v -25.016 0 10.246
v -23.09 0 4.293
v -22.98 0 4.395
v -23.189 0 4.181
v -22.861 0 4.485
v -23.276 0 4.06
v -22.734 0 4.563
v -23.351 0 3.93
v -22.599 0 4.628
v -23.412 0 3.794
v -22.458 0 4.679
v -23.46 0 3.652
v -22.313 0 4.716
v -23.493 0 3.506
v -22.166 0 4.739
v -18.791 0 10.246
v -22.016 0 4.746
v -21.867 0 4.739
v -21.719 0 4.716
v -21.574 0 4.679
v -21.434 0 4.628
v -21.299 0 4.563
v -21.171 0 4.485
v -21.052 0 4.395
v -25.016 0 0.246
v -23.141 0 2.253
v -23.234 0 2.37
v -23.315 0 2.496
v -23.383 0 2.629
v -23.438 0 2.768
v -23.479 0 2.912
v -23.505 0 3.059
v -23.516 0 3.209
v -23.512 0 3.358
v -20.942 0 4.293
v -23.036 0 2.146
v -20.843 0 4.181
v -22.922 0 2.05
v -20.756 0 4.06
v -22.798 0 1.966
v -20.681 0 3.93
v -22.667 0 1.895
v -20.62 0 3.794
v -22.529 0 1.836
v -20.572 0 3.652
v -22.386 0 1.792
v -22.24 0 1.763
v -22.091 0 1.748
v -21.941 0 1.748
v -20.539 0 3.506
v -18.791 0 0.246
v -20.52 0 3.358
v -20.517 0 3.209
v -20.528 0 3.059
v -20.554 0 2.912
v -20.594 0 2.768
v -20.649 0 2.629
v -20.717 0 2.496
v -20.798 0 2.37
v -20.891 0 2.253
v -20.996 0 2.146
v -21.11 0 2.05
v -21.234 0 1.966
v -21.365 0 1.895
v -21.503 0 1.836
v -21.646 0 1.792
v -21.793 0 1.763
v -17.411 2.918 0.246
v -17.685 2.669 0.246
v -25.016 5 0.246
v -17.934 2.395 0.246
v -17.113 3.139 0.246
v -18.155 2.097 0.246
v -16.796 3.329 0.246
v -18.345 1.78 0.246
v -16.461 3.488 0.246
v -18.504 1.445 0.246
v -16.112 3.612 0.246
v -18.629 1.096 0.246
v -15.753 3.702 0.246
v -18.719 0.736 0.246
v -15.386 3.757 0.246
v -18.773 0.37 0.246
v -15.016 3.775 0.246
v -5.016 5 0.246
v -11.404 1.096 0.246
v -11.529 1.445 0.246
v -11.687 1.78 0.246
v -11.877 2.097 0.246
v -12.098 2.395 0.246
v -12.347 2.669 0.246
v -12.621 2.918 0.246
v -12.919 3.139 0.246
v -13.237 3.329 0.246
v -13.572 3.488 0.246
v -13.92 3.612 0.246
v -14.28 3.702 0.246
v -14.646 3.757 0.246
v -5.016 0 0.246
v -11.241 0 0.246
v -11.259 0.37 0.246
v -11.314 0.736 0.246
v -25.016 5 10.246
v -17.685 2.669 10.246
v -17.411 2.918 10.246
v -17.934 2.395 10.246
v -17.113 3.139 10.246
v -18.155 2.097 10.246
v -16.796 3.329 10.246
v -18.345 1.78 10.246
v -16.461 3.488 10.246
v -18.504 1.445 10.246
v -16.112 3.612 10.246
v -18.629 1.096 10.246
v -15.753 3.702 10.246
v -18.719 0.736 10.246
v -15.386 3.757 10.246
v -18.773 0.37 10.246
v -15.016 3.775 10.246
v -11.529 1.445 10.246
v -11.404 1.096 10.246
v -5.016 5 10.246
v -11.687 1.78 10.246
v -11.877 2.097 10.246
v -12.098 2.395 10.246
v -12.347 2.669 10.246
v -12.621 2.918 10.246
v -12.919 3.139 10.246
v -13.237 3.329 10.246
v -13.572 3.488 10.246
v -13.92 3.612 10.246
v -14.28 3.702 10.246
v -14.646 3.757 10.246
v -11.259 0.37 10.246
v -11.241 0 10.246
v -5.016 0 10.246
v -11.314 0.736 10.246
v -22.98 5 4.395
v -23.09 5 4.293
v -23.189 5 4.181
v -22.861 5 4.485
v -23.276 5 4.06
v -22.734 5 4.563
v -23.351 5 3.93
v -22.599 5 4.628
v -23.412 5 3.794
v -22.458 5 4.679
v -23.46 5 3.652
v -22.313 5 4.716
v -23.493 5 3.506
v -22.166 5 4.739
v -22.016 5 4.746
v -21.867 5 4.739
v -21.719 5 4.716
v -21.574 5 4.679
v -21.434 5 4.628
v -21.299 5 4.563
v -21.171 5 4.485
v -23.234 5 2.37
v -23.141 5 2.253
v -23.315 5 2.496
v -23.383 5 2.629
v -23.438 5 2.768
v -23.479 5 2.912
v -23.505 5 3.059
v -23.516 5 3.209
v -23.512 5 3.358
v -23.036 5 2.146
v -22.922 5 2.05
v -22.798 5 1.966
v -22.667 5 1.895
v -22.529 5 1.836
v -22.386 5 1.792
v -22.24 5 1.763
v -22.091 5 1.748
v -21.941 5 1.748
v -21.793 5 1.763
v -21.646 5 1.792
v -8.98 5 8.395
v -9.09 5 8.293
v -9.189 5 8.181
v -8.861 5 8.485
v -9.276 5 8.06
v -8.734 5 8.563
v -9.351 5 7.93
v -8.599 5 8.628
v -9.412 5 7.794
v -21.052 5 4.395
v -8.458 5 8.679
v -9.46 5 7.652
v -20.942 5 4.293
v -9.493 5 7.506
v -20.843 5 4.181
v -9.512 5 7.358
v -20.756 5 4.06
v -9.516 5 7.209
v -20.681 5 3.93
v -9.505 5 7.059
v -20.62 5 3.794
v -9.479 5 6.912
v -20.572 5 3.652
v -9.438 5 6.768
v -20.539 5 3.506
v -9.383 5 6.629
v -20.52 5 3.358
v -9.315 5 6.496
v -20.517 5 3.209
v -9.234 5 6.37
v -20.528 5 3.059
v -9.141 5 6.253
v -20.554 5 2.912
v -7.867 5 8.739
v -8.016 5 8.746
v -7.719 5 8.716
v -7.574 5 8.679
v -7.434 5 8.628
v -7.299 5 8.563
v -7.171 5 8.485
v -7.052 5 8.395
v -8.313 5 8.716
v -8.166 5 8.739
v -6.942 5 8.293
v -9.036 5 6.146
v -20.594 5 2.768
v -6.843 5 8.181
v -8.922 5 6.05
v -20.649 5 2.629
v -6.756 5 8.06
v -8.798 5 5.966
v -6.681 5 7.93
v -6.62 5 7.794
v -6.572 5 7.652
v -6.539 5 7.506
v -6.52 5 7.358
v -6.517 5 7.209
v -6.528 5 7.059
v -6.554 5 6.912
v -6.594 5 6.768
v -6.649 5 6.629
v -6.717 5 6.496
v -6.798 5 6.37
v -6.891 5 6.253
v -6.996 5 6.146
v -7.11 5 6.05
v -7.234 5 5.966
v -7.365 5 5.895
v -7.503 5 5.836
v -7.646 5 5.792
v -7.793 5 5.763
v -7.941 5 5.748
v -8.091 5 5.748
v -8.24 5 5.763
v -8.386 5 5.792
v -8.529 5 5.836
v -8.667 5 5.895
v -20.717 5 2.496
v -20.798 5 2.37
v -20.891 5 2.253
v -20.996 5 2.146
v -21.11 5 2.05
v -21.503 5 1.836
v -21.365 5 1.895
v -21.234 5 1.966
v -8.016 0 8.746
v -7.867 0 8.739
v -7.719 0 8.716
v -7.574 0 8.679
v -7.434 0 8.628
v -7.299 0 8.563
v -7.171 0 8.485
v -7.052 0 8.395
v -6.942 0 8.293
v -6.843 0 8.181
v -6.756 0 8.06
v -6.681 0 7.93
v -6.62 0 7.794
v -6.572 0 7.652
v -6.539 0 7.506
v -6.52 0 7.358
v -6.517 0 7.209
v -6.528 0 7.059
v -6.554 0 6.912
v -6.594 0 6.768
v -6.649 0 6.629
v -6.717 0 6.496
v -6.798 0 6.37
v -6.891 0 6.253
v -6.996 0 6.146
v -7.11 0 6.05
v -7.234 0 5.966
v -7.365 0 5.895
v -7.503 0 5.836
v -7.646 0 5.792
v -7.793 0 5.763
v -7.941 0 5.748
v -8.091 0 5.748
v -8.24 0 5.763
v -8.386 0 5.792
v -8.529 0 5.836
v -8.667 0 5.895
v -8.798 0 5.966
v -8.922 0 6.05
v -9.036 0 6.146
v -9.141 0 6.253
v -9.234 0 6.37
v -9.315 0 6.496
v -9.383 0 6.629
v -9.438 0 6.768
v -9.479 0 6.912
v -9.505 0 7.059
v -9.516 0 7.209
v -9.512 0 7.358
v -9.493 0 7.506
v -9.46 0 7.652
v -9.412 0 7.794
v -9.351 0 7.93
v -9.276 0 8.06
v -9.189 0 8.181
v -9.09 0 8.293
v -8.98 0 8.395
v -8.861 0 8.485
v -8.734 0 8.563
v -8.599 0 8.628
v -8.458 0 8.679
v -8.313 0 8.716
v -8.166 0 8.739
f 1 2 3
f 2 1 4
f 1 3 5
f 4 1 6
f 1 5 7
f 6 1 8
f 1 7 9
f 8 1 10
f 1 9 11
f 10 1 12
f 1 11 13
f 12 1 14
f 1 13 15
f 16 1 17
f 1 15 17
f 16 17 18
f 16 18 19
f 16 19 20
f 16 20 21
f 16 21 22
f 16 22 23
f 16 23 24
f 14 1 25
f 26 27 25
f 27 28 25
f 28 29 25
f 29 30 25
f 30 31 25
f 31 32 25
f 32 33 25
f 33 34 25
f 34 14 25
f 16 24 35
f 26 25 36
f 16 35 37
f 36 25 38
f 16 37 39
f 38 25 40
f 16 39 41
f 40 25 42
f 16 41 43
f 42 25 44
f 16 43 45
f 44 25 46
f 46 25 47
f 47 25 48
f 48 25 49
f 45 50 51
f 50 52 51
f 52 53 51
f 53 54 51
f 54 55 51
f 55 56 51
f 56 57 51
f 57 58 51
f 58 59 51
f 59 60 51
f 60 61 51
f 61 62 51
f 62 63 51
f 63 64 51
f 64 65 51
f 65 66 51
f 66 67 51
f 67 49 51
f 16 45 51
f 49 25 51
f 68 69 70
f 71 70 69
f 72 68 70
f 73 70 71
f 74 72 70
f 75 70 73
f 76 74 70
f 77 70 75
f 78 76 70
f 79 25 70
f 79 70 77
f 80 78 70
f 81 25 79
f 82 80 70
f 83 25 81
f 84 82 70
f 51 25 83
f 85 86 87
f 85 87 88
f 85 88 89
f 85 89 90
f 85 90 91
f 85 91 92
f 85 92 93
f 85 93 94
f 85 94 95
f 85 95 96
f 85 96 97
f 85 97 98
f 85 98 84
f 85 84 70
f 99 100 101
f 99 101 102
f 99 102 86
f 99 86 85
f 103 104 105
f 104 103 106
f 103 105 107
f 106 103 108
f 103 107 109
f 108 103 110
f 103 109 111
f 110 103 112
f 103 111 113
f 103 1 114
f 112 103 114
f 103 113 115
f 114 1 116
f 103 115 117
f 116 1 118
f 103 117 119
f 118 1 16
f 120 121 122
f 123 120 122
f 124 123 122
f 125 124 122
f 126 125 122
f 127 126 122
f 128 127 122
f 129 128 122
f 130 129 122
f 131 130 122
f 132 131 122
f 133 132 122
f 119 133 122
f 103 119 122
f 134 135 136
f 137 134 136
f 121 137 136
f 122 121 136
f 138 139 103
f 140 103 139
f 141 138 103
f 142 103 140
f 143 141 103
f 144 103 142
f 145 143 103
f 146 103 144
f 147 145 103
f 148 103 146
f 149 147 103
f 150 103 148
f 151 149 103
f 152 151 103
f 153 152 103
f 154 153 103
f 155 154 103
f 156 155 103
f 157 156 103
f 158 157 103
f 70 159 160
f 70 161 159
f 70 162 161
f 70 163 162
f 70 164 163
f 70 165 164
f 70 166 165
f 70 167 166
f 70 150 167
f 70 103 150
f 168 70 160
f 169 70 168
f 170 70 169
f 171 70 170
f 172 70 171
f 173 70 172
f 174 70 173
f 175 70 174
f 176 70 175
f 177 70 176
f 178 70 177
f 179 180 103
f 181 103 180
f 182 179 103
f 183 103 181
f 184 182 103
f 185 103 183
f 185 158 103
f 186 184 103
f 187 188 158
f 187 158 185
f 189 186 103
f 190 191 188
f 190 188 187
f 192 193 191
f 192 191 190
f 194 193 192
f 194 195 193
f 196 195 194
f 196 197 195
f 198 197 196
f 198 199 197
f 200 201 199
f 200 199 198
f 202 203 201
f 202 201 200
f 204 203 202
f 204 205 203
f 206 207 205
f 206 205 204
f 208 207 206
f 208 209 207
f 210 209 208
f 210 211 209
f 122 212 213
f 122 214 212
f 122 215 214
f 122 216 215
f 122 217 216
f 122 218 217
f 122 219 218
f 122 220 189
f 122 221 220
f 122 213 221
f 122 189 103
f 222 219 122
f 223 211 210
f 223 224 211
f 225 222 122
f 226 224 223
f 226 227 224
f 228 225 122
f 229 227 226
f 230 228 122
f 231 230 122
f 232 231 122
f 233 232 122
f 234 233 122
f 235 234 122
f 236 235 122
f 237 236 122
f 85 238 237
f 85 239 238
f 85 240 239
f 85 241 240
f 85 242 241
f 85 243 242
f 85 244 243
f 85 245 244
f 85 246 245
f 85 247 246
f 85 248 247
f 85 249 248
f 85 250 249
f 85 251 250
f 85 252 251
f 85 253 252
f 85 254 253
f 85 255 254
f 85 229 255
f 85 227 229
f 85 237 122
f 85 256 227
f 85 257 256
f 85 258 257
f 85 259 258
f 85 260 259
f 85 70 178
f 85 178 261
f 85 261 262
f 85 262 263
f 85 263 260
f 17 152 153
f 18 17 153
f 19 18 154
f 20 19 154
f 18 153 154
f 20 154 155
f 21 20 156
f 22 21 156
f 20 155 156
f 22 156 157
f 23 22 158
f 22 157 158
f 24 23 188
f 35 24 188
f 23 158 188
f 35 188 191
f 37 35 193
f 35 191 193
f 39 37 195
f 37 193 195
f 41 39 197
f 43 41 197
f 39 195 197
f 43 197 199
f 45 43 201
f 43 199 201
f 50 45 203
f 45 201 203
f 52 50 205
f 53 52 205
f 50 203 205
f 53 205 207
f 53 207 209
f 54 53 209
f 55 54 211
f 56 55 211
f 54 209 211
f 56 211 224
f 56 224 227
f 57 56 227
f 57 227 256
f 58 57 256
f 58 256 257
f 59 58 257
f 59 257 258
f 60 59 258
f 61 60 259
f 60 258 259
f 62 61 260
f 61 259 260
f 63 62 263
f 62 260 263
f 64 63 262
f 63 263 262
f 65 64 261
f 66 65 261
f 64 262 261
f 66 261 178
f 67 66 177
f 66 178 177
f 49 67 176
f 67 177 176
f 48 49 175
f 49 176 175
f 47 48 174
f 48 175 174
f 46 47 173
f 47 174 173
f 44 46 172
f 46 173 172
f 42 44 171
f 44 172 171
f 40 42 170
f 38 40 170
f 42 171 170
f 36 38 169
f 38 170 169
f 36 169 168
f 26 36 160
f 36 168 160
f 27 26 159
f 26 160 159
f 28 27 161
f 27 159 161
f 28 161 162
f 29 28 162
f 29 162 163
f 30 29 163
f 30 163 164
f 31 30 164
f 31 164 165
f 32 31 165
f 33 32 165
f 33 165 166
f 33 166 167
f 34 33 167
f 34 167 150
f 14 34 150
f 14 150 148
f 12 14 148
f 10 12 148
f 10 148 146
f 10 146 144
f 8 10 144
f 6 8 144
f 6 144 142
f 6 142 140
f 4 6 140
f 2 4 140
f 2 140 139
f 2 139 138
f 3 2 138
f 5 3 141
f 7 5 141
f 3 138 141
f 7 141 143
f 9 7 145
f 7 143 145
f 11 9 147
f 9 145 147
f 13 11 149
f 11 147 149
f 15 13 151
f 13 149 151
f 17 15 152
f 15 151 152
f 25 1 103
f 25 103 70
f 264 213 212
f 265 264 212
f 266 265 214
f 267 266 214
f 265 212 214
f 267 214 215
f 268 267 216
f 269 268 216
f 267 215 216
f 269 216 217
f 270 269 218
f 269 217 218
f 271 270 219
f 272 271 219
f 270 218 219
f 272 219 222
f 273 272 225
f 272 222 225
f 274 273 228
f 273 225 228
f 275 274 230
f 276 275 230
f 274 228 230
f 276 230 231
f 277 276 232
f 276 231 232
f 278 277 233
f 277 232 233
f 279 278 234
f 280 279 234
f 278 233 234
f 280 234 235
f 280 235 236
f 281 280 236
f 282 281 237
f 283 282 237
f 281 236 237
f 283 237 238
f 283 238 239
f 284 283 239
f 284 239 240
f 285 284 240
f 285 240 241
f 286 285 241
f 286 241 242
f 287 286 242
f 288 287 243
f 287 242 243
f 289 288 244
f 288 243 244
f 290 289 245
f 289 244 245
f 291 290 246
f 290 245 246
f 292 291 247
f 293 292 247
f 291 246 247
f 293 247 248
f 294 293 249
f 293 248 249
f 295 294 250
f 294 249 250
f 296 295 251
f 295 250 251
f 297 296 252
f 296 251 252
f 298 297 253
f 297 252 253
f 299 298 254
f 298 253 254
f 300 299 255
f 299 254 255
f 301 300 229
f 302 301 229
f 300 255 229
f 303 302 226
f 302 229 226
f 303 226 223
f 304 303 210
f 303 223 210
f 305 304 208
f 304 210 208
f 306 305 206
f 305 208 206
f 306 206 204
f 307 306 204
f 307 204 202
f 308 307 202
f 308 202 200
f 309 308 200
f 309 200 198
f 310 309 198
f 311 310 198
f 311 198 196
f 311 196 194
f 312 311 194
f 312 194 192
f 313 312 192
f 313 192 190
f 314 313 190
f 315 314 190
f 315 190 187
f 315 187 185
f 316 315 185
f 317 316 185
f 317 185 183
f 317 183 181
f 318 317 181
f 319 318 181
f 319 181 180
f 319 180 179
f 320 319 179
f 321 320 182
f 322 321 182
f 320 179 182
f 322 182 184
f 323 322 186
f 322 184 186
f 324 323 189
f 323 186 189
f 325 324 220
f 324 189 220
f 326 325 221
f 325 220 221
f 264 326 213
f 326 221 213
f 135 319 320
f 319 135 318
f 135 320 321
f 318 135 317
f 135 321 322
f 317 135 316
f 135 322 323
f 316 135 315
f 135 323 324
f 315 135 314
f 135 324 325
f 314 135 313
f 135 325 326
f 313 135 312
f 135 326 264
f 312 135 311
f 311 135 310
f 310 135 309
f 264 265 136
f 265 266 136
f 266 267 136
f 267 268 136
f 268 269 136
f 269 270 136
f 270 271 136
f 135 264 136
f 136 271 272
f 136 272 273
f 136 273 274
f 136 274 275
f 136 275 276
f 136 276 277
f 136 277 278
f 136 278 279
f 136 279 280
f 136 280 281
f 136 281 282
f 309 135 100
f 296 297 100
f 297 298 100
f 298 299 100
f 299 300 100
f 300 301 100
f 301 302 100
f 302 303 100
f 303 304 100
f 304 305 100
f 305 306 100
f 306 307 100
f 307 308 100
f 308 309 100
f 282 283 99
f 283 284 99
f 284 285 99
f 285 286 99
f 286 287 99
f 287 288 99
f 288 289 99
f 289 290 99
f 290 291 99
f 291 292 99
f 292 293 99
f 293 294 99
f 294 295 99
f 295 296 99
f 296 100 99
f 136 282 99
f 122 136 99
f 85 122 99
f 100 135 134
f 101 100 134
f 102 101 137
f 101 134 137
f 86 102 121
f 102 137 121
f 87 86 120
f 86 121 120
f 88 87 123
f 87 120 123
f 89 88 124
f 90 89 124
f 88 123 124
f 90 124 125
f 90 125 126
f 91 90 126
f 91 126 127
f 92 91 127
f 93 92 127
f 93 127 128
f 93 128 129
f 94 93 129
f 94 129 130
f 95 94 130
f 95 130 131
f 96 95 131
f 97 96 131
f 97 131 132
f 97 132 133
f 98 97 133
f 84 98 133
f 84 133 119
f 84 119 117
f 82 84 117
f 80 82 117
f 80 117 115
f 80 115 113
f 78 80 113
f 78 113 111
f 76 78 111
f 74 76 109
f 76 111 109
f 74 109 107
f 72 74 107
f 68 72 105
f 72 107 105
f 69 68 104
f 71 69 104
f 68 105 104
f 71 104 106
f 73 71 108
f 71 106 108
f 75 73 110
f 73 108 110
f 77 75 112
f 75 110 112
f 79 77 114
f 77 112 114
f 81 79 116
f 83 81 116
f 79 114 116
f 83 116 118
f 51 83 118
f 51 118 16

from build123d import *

# Parameters (mm, degrees)
SKETCH1_W           = 20
SKETCH1_H           = 10
BOSS_EXTRUDE1_DEPTH = 5
SKETCH2_R           = 3.775
CUT_EXTRUDE1_DEPTH  = 10
SKETCH3_R           = 1.5
CUT_EXTRUDE2_DEPTH  = 5


with BuildPart() as part:
    # Sketch1 → Boss-Extrude1 (new body)
    with BuildSketch(Plane(origin=(0, 0, 0), x_dir=(1, 0, 0), z_dir=(0, 1, 0))):
        with Locations((-15.016162702, -5.245981532)):
            Rectangle(SKETCH1_W, SKETCH1_H)
    extrude(amount=BOSS_EXTRUDE1_DEPTH)

    # Sketch2 → Cut-Extrude1 (cut)
    with BuildSketch(Plane.XY.offset(10.245981532)):
        with Locations((-15.016162702, 0)):
            Circle(SKETCH2_R)
    extrude(amount=-CUT_EXTRUDE1_DEPTH, mode=Mode.SUBTRACT)

    # Sketch3 → Cut-Extrude2 (cut)
    with BuildSketch(Plane(origin=(0, 5, 0), x_dir=(1, 0, 0), z_dir=(0, 1, 0))):
        with Locations(Location((-22.016162702, -3.245981532, 0), (0, 0, 270))):
            Circle(SKETCH3_R)
        with Locations(Location((-8.016162702, -7.245981532, 0), (0, 0, 270))):
            Circle(SKETCH3_R)
    extrude(amount=-CUT_EXTRUDE2_DEPTH, mode=Mode.SUBTRACT)


solid = part.part
